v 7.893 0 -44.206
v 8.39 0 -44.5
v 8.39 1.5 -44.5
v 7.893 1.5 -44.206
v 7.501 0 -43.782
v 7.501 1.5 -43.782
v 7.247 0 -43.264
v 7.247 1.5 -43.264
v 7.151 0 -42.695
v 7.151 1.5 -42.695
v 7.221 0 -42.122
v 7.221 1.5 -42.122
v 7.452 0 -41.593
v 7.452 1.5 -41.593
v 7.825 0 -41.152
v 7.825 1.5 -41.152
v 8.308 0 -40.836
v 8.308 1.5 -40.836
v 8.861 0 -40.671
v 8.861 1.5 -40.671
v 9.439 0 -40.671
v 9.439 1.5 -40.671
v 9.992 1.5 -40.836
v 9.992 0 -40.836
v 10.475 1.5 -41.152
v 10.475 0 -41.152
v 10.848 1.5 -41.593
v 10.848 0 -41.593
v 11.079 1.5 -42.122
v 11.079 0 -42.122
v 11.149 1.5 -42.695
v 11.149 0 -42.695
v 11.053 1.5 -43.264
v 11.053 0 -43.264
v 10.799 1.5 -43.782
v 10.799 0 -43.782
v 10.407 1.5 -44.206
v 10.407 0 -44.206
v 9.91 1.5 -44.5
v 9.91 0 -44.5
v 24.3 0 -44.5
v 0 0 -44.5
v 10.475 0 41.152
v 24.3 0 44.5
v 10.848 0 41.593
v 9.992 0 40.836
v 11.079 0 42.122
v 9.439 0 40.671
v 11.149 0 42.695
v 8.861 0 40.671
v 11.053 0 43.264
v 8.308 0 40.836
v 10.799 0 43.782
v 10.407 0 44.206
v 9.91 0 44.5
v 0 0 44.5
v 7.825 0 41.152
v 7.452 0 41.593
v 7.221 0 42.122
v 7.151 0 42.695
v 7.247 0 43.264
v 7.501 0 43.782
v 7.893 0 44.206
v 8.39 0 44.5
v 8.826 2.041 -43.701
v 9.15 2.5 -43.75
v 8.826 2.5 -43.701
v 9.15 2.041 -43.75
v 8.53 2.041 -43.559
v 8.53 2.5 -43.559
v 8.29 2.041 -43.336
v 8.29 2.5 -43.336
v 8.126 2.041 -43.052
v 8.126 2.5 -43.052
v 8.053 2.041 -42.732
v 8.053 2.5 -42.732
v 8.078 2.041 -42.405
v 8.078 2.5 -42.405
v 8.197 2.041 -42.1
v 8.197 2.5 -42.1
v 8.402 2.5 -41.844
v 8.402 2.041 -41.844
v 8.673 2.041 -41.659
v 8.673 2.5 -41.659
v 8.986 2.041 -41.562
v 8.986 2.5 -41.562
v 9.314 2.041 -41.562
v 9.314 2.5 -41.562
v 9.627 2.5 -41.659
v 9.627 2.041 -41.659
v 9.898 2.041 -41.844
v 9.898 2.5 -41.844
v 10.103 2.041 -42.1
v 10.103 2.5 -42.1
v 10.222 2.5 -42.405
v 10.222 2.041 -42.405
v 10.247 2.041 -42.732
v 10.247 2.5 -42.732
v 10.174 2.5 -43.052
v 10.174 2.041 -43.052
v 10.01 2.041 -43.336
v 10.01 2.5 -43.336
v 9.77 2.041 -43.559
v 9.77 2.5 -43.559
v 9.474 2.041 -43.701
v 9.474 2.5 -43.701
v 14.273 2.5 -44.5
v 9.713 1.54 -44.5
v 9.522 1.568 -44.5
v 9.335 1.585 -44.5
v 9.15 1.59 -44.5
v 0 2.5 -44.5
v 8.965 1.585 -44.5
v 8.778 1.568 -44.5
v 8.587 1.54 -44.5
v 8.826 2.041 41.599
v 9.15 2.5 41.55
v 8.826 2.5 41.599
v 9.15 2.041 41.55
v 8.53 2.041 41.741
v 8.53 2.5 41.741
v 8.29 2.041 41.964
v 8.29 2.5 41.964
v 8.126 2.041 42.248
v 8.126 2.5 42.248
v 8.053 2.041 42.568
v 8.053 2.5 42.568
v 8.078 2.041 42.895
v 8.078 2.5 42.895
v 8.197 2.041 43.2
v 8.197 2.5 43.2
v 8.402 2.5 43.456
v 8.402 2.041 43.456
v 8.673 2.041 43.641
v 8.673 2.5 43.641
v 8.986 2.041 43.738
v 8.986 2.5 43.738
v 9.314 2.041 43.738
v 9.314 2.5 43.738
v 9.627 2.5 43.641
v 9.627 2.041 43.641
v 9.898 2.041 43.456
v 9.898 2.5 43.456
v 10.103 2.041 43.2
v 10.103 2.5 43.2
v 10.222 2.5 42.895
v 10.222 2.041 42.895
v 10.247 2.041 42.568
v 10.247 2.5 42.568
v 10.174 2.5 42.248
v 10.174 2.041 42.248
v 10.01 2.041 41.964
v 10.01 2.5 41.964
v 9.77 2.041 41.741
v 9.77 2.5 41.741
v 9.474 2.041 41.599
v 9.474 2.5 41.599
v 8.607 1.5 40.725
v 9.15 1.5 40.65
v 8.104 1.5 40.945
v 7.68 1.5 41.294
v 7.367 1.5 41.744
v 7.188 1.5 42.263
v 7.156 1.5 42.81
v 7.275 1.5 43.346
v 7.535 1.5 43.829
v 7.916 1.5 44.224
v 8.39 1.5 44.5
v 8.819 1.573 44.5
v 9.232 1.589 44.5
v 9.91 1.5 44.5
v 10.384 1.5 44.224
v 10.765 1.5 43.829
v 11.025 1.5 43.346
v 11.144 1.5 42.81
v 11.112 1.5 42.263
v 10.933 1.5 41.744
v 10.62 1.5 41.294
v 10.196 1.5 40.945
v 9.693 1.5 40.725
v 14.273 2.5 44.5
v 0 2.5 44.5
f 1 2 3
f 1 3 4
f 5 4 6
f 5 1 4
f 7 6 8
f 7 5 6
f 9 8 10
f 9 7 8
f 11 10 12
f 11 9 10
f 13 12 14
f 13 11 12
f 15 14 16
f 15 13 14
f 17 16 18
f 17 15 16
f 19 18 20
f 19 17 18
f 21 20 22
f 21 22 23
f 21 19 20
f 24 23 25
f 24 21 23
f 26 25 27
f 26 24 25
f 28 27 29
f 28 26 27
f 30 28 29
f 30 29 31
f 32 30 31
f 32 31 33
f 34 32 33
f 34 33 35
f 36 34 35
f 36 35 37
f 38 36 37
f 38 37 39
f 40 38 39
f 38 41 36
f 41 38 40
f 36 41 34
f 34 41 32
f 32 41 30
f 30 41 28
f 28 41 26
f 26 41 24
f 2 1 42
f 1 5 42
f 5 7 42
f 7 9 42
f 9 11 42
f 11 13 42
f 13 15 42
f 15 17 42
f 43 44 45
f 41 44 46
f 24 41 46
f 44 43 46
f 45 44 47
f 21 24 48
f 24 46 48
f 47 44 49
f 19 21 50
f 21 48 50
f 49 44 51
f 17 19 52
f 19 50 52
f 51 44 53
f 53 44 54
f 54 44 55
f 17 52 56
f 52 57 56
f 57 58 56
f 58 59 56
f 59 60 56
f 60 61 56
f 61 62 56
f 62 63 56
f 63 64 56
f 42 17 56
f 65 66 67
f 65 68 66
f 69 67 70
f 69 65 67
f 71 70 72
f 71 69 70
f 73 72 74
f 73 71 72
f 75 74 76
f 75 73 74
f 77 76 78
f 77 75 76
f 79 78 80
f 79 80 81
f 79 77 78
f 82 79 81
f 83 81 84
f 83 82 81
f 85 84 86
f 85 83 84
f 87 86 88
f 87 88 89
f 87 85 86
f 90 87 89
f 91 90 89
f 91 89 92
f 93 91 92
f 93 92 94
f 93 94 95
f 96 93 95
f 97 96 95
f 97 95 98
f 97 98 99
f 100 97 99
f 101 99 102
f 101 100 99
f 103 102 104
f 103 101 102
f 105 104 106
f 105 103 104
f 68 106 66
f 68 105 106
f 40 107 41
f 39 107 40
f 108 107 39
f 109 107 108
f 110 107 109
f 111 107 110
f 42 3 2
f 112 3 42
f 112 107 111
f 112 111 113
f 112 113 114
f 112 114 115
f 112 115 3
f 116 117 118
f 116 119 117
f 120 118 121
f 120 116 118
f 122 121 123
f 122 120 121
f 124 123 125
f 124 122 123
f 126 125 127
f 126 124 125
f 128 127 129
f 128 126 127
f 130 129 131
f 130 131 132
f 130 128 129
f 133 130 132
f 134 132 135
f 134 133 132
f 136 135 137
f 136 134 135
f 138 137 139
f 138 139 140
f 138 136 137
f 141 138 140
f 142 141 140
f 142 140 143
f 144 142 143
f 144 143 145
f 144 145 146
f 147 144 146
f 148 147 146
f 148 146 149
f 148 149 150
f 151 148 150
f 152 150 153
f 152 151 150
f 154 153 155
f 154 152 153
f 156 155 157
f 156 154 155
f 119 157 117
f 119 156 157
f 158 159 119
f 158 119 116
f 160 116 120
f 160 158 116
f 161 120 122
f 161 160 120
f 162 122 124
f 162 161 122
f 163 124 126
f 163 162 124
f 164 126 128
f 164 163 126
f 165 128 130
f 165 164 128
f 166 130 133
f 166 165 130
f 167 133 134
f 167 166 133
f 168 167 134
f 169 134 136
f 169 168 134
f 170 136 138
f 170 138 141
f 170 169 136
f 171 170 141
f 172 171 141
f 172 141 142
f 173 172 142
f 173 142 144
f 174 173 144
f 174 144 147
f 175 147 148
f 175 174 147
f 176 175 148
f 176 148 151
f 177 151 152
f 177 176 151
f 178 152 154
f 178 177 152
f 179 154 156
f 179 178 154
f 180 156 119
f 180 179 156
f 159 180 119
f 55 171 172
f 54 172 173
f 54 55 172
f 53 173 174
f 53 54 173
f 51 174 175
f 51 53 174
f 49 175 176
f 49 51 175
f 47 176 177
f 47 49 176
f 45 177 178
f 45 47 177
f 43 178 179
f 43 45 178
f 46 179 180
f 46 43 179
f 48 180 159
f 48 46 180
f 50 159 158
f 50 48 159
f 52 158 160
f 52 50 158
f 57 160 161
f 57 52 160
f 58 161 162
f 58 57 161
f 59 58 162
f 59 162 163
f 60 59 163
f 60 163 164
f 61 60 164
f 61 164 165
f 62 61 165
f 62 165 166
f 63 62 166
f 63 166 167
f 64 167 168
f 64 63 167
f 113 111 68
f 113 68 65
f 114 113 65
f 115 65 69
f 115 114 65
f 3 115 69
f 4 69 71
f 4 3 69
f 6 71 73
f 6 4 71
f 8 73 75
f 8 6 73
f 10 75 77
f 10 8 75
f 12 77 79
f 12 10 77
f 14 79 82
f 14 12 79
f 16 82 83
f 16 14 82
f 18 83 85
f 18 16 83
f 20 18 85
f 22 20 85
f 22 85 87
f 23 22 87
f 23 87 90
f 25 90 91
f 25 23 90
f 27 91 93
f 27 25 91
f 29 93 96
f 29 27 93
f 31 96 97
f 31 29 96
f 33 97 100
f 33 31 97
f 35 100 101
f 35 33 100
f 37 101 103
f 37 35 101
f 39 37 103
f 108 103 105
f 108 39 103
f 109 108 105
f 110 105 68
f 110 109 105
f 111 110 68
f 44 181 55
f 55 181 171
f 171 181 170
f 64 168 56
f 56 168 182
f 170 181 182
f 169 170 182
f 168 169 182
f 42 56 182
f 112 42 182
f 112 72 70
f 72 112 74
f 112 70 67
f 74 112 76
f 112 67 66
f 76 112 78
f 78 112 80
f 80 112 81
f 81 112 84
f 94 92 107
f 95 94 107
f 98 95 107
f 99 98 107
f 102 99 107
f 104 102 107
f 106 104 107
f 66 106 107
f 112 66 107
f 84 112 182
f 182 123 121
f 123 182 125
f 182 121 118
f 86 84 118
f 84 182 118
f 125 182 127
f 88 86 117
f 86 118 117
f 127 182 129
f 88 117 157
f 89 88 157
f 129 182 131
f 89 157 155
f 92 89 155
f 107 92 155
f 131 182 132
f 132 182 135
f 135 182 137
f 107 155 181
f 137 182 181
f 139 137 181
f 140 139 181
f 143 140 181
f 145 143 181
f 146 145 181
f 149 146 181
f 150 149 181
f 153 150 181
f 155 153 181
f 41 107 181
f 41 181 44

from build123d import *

# Parameters (mm, degrees)
BOSS_EXTRUDE1_DEPTH = 44.5
HOLEWZD2_AT_2_COUNT = 2
HOLEWZD2_AT_2_PITCH = 85.3


with BuildPart() as part:
    # Sketch1 → Boss-Extrude1 (new, symmetric)
    with BuildSketch(Plane.XY):
        Polygon((0, 0), (0, 2.5), (14.273047666, 2.5), (24.3, 0), align=None)
    extrude(amount=BOSS_EXTRUDE1_DEPTH, both=True)

    # Sketch6 → HoleWzd2 (revolve, cut)
    with BuildSketch(Plane(origin=(9.15, 0, 42.65), x_dir=(0, 0, -1), z_dir=(1, 0, 0))):
        Polygon((0, 0), (0, 2.5), (1.1, 2.5), (1.1, 2.040774557), (2, 1.5), (2, 0), align=None)
    holewzd2 = revolve(axis=Axis((9.15, -6.130023899, 42.65), (0, 1, 0)), mode=Mode.SUBTRACT)

    # HoleWzd2 at 2: HoleWzd2 ×2
    with Locations(*[(0, 0, -i * HOLEWZD2_AT_2_PITCH) for i in range(1, HOLEWZD2_AT_2_COUNT)]):
        add(holewzd2, mode=Mode.SUBTRACT)


solid = part.part
